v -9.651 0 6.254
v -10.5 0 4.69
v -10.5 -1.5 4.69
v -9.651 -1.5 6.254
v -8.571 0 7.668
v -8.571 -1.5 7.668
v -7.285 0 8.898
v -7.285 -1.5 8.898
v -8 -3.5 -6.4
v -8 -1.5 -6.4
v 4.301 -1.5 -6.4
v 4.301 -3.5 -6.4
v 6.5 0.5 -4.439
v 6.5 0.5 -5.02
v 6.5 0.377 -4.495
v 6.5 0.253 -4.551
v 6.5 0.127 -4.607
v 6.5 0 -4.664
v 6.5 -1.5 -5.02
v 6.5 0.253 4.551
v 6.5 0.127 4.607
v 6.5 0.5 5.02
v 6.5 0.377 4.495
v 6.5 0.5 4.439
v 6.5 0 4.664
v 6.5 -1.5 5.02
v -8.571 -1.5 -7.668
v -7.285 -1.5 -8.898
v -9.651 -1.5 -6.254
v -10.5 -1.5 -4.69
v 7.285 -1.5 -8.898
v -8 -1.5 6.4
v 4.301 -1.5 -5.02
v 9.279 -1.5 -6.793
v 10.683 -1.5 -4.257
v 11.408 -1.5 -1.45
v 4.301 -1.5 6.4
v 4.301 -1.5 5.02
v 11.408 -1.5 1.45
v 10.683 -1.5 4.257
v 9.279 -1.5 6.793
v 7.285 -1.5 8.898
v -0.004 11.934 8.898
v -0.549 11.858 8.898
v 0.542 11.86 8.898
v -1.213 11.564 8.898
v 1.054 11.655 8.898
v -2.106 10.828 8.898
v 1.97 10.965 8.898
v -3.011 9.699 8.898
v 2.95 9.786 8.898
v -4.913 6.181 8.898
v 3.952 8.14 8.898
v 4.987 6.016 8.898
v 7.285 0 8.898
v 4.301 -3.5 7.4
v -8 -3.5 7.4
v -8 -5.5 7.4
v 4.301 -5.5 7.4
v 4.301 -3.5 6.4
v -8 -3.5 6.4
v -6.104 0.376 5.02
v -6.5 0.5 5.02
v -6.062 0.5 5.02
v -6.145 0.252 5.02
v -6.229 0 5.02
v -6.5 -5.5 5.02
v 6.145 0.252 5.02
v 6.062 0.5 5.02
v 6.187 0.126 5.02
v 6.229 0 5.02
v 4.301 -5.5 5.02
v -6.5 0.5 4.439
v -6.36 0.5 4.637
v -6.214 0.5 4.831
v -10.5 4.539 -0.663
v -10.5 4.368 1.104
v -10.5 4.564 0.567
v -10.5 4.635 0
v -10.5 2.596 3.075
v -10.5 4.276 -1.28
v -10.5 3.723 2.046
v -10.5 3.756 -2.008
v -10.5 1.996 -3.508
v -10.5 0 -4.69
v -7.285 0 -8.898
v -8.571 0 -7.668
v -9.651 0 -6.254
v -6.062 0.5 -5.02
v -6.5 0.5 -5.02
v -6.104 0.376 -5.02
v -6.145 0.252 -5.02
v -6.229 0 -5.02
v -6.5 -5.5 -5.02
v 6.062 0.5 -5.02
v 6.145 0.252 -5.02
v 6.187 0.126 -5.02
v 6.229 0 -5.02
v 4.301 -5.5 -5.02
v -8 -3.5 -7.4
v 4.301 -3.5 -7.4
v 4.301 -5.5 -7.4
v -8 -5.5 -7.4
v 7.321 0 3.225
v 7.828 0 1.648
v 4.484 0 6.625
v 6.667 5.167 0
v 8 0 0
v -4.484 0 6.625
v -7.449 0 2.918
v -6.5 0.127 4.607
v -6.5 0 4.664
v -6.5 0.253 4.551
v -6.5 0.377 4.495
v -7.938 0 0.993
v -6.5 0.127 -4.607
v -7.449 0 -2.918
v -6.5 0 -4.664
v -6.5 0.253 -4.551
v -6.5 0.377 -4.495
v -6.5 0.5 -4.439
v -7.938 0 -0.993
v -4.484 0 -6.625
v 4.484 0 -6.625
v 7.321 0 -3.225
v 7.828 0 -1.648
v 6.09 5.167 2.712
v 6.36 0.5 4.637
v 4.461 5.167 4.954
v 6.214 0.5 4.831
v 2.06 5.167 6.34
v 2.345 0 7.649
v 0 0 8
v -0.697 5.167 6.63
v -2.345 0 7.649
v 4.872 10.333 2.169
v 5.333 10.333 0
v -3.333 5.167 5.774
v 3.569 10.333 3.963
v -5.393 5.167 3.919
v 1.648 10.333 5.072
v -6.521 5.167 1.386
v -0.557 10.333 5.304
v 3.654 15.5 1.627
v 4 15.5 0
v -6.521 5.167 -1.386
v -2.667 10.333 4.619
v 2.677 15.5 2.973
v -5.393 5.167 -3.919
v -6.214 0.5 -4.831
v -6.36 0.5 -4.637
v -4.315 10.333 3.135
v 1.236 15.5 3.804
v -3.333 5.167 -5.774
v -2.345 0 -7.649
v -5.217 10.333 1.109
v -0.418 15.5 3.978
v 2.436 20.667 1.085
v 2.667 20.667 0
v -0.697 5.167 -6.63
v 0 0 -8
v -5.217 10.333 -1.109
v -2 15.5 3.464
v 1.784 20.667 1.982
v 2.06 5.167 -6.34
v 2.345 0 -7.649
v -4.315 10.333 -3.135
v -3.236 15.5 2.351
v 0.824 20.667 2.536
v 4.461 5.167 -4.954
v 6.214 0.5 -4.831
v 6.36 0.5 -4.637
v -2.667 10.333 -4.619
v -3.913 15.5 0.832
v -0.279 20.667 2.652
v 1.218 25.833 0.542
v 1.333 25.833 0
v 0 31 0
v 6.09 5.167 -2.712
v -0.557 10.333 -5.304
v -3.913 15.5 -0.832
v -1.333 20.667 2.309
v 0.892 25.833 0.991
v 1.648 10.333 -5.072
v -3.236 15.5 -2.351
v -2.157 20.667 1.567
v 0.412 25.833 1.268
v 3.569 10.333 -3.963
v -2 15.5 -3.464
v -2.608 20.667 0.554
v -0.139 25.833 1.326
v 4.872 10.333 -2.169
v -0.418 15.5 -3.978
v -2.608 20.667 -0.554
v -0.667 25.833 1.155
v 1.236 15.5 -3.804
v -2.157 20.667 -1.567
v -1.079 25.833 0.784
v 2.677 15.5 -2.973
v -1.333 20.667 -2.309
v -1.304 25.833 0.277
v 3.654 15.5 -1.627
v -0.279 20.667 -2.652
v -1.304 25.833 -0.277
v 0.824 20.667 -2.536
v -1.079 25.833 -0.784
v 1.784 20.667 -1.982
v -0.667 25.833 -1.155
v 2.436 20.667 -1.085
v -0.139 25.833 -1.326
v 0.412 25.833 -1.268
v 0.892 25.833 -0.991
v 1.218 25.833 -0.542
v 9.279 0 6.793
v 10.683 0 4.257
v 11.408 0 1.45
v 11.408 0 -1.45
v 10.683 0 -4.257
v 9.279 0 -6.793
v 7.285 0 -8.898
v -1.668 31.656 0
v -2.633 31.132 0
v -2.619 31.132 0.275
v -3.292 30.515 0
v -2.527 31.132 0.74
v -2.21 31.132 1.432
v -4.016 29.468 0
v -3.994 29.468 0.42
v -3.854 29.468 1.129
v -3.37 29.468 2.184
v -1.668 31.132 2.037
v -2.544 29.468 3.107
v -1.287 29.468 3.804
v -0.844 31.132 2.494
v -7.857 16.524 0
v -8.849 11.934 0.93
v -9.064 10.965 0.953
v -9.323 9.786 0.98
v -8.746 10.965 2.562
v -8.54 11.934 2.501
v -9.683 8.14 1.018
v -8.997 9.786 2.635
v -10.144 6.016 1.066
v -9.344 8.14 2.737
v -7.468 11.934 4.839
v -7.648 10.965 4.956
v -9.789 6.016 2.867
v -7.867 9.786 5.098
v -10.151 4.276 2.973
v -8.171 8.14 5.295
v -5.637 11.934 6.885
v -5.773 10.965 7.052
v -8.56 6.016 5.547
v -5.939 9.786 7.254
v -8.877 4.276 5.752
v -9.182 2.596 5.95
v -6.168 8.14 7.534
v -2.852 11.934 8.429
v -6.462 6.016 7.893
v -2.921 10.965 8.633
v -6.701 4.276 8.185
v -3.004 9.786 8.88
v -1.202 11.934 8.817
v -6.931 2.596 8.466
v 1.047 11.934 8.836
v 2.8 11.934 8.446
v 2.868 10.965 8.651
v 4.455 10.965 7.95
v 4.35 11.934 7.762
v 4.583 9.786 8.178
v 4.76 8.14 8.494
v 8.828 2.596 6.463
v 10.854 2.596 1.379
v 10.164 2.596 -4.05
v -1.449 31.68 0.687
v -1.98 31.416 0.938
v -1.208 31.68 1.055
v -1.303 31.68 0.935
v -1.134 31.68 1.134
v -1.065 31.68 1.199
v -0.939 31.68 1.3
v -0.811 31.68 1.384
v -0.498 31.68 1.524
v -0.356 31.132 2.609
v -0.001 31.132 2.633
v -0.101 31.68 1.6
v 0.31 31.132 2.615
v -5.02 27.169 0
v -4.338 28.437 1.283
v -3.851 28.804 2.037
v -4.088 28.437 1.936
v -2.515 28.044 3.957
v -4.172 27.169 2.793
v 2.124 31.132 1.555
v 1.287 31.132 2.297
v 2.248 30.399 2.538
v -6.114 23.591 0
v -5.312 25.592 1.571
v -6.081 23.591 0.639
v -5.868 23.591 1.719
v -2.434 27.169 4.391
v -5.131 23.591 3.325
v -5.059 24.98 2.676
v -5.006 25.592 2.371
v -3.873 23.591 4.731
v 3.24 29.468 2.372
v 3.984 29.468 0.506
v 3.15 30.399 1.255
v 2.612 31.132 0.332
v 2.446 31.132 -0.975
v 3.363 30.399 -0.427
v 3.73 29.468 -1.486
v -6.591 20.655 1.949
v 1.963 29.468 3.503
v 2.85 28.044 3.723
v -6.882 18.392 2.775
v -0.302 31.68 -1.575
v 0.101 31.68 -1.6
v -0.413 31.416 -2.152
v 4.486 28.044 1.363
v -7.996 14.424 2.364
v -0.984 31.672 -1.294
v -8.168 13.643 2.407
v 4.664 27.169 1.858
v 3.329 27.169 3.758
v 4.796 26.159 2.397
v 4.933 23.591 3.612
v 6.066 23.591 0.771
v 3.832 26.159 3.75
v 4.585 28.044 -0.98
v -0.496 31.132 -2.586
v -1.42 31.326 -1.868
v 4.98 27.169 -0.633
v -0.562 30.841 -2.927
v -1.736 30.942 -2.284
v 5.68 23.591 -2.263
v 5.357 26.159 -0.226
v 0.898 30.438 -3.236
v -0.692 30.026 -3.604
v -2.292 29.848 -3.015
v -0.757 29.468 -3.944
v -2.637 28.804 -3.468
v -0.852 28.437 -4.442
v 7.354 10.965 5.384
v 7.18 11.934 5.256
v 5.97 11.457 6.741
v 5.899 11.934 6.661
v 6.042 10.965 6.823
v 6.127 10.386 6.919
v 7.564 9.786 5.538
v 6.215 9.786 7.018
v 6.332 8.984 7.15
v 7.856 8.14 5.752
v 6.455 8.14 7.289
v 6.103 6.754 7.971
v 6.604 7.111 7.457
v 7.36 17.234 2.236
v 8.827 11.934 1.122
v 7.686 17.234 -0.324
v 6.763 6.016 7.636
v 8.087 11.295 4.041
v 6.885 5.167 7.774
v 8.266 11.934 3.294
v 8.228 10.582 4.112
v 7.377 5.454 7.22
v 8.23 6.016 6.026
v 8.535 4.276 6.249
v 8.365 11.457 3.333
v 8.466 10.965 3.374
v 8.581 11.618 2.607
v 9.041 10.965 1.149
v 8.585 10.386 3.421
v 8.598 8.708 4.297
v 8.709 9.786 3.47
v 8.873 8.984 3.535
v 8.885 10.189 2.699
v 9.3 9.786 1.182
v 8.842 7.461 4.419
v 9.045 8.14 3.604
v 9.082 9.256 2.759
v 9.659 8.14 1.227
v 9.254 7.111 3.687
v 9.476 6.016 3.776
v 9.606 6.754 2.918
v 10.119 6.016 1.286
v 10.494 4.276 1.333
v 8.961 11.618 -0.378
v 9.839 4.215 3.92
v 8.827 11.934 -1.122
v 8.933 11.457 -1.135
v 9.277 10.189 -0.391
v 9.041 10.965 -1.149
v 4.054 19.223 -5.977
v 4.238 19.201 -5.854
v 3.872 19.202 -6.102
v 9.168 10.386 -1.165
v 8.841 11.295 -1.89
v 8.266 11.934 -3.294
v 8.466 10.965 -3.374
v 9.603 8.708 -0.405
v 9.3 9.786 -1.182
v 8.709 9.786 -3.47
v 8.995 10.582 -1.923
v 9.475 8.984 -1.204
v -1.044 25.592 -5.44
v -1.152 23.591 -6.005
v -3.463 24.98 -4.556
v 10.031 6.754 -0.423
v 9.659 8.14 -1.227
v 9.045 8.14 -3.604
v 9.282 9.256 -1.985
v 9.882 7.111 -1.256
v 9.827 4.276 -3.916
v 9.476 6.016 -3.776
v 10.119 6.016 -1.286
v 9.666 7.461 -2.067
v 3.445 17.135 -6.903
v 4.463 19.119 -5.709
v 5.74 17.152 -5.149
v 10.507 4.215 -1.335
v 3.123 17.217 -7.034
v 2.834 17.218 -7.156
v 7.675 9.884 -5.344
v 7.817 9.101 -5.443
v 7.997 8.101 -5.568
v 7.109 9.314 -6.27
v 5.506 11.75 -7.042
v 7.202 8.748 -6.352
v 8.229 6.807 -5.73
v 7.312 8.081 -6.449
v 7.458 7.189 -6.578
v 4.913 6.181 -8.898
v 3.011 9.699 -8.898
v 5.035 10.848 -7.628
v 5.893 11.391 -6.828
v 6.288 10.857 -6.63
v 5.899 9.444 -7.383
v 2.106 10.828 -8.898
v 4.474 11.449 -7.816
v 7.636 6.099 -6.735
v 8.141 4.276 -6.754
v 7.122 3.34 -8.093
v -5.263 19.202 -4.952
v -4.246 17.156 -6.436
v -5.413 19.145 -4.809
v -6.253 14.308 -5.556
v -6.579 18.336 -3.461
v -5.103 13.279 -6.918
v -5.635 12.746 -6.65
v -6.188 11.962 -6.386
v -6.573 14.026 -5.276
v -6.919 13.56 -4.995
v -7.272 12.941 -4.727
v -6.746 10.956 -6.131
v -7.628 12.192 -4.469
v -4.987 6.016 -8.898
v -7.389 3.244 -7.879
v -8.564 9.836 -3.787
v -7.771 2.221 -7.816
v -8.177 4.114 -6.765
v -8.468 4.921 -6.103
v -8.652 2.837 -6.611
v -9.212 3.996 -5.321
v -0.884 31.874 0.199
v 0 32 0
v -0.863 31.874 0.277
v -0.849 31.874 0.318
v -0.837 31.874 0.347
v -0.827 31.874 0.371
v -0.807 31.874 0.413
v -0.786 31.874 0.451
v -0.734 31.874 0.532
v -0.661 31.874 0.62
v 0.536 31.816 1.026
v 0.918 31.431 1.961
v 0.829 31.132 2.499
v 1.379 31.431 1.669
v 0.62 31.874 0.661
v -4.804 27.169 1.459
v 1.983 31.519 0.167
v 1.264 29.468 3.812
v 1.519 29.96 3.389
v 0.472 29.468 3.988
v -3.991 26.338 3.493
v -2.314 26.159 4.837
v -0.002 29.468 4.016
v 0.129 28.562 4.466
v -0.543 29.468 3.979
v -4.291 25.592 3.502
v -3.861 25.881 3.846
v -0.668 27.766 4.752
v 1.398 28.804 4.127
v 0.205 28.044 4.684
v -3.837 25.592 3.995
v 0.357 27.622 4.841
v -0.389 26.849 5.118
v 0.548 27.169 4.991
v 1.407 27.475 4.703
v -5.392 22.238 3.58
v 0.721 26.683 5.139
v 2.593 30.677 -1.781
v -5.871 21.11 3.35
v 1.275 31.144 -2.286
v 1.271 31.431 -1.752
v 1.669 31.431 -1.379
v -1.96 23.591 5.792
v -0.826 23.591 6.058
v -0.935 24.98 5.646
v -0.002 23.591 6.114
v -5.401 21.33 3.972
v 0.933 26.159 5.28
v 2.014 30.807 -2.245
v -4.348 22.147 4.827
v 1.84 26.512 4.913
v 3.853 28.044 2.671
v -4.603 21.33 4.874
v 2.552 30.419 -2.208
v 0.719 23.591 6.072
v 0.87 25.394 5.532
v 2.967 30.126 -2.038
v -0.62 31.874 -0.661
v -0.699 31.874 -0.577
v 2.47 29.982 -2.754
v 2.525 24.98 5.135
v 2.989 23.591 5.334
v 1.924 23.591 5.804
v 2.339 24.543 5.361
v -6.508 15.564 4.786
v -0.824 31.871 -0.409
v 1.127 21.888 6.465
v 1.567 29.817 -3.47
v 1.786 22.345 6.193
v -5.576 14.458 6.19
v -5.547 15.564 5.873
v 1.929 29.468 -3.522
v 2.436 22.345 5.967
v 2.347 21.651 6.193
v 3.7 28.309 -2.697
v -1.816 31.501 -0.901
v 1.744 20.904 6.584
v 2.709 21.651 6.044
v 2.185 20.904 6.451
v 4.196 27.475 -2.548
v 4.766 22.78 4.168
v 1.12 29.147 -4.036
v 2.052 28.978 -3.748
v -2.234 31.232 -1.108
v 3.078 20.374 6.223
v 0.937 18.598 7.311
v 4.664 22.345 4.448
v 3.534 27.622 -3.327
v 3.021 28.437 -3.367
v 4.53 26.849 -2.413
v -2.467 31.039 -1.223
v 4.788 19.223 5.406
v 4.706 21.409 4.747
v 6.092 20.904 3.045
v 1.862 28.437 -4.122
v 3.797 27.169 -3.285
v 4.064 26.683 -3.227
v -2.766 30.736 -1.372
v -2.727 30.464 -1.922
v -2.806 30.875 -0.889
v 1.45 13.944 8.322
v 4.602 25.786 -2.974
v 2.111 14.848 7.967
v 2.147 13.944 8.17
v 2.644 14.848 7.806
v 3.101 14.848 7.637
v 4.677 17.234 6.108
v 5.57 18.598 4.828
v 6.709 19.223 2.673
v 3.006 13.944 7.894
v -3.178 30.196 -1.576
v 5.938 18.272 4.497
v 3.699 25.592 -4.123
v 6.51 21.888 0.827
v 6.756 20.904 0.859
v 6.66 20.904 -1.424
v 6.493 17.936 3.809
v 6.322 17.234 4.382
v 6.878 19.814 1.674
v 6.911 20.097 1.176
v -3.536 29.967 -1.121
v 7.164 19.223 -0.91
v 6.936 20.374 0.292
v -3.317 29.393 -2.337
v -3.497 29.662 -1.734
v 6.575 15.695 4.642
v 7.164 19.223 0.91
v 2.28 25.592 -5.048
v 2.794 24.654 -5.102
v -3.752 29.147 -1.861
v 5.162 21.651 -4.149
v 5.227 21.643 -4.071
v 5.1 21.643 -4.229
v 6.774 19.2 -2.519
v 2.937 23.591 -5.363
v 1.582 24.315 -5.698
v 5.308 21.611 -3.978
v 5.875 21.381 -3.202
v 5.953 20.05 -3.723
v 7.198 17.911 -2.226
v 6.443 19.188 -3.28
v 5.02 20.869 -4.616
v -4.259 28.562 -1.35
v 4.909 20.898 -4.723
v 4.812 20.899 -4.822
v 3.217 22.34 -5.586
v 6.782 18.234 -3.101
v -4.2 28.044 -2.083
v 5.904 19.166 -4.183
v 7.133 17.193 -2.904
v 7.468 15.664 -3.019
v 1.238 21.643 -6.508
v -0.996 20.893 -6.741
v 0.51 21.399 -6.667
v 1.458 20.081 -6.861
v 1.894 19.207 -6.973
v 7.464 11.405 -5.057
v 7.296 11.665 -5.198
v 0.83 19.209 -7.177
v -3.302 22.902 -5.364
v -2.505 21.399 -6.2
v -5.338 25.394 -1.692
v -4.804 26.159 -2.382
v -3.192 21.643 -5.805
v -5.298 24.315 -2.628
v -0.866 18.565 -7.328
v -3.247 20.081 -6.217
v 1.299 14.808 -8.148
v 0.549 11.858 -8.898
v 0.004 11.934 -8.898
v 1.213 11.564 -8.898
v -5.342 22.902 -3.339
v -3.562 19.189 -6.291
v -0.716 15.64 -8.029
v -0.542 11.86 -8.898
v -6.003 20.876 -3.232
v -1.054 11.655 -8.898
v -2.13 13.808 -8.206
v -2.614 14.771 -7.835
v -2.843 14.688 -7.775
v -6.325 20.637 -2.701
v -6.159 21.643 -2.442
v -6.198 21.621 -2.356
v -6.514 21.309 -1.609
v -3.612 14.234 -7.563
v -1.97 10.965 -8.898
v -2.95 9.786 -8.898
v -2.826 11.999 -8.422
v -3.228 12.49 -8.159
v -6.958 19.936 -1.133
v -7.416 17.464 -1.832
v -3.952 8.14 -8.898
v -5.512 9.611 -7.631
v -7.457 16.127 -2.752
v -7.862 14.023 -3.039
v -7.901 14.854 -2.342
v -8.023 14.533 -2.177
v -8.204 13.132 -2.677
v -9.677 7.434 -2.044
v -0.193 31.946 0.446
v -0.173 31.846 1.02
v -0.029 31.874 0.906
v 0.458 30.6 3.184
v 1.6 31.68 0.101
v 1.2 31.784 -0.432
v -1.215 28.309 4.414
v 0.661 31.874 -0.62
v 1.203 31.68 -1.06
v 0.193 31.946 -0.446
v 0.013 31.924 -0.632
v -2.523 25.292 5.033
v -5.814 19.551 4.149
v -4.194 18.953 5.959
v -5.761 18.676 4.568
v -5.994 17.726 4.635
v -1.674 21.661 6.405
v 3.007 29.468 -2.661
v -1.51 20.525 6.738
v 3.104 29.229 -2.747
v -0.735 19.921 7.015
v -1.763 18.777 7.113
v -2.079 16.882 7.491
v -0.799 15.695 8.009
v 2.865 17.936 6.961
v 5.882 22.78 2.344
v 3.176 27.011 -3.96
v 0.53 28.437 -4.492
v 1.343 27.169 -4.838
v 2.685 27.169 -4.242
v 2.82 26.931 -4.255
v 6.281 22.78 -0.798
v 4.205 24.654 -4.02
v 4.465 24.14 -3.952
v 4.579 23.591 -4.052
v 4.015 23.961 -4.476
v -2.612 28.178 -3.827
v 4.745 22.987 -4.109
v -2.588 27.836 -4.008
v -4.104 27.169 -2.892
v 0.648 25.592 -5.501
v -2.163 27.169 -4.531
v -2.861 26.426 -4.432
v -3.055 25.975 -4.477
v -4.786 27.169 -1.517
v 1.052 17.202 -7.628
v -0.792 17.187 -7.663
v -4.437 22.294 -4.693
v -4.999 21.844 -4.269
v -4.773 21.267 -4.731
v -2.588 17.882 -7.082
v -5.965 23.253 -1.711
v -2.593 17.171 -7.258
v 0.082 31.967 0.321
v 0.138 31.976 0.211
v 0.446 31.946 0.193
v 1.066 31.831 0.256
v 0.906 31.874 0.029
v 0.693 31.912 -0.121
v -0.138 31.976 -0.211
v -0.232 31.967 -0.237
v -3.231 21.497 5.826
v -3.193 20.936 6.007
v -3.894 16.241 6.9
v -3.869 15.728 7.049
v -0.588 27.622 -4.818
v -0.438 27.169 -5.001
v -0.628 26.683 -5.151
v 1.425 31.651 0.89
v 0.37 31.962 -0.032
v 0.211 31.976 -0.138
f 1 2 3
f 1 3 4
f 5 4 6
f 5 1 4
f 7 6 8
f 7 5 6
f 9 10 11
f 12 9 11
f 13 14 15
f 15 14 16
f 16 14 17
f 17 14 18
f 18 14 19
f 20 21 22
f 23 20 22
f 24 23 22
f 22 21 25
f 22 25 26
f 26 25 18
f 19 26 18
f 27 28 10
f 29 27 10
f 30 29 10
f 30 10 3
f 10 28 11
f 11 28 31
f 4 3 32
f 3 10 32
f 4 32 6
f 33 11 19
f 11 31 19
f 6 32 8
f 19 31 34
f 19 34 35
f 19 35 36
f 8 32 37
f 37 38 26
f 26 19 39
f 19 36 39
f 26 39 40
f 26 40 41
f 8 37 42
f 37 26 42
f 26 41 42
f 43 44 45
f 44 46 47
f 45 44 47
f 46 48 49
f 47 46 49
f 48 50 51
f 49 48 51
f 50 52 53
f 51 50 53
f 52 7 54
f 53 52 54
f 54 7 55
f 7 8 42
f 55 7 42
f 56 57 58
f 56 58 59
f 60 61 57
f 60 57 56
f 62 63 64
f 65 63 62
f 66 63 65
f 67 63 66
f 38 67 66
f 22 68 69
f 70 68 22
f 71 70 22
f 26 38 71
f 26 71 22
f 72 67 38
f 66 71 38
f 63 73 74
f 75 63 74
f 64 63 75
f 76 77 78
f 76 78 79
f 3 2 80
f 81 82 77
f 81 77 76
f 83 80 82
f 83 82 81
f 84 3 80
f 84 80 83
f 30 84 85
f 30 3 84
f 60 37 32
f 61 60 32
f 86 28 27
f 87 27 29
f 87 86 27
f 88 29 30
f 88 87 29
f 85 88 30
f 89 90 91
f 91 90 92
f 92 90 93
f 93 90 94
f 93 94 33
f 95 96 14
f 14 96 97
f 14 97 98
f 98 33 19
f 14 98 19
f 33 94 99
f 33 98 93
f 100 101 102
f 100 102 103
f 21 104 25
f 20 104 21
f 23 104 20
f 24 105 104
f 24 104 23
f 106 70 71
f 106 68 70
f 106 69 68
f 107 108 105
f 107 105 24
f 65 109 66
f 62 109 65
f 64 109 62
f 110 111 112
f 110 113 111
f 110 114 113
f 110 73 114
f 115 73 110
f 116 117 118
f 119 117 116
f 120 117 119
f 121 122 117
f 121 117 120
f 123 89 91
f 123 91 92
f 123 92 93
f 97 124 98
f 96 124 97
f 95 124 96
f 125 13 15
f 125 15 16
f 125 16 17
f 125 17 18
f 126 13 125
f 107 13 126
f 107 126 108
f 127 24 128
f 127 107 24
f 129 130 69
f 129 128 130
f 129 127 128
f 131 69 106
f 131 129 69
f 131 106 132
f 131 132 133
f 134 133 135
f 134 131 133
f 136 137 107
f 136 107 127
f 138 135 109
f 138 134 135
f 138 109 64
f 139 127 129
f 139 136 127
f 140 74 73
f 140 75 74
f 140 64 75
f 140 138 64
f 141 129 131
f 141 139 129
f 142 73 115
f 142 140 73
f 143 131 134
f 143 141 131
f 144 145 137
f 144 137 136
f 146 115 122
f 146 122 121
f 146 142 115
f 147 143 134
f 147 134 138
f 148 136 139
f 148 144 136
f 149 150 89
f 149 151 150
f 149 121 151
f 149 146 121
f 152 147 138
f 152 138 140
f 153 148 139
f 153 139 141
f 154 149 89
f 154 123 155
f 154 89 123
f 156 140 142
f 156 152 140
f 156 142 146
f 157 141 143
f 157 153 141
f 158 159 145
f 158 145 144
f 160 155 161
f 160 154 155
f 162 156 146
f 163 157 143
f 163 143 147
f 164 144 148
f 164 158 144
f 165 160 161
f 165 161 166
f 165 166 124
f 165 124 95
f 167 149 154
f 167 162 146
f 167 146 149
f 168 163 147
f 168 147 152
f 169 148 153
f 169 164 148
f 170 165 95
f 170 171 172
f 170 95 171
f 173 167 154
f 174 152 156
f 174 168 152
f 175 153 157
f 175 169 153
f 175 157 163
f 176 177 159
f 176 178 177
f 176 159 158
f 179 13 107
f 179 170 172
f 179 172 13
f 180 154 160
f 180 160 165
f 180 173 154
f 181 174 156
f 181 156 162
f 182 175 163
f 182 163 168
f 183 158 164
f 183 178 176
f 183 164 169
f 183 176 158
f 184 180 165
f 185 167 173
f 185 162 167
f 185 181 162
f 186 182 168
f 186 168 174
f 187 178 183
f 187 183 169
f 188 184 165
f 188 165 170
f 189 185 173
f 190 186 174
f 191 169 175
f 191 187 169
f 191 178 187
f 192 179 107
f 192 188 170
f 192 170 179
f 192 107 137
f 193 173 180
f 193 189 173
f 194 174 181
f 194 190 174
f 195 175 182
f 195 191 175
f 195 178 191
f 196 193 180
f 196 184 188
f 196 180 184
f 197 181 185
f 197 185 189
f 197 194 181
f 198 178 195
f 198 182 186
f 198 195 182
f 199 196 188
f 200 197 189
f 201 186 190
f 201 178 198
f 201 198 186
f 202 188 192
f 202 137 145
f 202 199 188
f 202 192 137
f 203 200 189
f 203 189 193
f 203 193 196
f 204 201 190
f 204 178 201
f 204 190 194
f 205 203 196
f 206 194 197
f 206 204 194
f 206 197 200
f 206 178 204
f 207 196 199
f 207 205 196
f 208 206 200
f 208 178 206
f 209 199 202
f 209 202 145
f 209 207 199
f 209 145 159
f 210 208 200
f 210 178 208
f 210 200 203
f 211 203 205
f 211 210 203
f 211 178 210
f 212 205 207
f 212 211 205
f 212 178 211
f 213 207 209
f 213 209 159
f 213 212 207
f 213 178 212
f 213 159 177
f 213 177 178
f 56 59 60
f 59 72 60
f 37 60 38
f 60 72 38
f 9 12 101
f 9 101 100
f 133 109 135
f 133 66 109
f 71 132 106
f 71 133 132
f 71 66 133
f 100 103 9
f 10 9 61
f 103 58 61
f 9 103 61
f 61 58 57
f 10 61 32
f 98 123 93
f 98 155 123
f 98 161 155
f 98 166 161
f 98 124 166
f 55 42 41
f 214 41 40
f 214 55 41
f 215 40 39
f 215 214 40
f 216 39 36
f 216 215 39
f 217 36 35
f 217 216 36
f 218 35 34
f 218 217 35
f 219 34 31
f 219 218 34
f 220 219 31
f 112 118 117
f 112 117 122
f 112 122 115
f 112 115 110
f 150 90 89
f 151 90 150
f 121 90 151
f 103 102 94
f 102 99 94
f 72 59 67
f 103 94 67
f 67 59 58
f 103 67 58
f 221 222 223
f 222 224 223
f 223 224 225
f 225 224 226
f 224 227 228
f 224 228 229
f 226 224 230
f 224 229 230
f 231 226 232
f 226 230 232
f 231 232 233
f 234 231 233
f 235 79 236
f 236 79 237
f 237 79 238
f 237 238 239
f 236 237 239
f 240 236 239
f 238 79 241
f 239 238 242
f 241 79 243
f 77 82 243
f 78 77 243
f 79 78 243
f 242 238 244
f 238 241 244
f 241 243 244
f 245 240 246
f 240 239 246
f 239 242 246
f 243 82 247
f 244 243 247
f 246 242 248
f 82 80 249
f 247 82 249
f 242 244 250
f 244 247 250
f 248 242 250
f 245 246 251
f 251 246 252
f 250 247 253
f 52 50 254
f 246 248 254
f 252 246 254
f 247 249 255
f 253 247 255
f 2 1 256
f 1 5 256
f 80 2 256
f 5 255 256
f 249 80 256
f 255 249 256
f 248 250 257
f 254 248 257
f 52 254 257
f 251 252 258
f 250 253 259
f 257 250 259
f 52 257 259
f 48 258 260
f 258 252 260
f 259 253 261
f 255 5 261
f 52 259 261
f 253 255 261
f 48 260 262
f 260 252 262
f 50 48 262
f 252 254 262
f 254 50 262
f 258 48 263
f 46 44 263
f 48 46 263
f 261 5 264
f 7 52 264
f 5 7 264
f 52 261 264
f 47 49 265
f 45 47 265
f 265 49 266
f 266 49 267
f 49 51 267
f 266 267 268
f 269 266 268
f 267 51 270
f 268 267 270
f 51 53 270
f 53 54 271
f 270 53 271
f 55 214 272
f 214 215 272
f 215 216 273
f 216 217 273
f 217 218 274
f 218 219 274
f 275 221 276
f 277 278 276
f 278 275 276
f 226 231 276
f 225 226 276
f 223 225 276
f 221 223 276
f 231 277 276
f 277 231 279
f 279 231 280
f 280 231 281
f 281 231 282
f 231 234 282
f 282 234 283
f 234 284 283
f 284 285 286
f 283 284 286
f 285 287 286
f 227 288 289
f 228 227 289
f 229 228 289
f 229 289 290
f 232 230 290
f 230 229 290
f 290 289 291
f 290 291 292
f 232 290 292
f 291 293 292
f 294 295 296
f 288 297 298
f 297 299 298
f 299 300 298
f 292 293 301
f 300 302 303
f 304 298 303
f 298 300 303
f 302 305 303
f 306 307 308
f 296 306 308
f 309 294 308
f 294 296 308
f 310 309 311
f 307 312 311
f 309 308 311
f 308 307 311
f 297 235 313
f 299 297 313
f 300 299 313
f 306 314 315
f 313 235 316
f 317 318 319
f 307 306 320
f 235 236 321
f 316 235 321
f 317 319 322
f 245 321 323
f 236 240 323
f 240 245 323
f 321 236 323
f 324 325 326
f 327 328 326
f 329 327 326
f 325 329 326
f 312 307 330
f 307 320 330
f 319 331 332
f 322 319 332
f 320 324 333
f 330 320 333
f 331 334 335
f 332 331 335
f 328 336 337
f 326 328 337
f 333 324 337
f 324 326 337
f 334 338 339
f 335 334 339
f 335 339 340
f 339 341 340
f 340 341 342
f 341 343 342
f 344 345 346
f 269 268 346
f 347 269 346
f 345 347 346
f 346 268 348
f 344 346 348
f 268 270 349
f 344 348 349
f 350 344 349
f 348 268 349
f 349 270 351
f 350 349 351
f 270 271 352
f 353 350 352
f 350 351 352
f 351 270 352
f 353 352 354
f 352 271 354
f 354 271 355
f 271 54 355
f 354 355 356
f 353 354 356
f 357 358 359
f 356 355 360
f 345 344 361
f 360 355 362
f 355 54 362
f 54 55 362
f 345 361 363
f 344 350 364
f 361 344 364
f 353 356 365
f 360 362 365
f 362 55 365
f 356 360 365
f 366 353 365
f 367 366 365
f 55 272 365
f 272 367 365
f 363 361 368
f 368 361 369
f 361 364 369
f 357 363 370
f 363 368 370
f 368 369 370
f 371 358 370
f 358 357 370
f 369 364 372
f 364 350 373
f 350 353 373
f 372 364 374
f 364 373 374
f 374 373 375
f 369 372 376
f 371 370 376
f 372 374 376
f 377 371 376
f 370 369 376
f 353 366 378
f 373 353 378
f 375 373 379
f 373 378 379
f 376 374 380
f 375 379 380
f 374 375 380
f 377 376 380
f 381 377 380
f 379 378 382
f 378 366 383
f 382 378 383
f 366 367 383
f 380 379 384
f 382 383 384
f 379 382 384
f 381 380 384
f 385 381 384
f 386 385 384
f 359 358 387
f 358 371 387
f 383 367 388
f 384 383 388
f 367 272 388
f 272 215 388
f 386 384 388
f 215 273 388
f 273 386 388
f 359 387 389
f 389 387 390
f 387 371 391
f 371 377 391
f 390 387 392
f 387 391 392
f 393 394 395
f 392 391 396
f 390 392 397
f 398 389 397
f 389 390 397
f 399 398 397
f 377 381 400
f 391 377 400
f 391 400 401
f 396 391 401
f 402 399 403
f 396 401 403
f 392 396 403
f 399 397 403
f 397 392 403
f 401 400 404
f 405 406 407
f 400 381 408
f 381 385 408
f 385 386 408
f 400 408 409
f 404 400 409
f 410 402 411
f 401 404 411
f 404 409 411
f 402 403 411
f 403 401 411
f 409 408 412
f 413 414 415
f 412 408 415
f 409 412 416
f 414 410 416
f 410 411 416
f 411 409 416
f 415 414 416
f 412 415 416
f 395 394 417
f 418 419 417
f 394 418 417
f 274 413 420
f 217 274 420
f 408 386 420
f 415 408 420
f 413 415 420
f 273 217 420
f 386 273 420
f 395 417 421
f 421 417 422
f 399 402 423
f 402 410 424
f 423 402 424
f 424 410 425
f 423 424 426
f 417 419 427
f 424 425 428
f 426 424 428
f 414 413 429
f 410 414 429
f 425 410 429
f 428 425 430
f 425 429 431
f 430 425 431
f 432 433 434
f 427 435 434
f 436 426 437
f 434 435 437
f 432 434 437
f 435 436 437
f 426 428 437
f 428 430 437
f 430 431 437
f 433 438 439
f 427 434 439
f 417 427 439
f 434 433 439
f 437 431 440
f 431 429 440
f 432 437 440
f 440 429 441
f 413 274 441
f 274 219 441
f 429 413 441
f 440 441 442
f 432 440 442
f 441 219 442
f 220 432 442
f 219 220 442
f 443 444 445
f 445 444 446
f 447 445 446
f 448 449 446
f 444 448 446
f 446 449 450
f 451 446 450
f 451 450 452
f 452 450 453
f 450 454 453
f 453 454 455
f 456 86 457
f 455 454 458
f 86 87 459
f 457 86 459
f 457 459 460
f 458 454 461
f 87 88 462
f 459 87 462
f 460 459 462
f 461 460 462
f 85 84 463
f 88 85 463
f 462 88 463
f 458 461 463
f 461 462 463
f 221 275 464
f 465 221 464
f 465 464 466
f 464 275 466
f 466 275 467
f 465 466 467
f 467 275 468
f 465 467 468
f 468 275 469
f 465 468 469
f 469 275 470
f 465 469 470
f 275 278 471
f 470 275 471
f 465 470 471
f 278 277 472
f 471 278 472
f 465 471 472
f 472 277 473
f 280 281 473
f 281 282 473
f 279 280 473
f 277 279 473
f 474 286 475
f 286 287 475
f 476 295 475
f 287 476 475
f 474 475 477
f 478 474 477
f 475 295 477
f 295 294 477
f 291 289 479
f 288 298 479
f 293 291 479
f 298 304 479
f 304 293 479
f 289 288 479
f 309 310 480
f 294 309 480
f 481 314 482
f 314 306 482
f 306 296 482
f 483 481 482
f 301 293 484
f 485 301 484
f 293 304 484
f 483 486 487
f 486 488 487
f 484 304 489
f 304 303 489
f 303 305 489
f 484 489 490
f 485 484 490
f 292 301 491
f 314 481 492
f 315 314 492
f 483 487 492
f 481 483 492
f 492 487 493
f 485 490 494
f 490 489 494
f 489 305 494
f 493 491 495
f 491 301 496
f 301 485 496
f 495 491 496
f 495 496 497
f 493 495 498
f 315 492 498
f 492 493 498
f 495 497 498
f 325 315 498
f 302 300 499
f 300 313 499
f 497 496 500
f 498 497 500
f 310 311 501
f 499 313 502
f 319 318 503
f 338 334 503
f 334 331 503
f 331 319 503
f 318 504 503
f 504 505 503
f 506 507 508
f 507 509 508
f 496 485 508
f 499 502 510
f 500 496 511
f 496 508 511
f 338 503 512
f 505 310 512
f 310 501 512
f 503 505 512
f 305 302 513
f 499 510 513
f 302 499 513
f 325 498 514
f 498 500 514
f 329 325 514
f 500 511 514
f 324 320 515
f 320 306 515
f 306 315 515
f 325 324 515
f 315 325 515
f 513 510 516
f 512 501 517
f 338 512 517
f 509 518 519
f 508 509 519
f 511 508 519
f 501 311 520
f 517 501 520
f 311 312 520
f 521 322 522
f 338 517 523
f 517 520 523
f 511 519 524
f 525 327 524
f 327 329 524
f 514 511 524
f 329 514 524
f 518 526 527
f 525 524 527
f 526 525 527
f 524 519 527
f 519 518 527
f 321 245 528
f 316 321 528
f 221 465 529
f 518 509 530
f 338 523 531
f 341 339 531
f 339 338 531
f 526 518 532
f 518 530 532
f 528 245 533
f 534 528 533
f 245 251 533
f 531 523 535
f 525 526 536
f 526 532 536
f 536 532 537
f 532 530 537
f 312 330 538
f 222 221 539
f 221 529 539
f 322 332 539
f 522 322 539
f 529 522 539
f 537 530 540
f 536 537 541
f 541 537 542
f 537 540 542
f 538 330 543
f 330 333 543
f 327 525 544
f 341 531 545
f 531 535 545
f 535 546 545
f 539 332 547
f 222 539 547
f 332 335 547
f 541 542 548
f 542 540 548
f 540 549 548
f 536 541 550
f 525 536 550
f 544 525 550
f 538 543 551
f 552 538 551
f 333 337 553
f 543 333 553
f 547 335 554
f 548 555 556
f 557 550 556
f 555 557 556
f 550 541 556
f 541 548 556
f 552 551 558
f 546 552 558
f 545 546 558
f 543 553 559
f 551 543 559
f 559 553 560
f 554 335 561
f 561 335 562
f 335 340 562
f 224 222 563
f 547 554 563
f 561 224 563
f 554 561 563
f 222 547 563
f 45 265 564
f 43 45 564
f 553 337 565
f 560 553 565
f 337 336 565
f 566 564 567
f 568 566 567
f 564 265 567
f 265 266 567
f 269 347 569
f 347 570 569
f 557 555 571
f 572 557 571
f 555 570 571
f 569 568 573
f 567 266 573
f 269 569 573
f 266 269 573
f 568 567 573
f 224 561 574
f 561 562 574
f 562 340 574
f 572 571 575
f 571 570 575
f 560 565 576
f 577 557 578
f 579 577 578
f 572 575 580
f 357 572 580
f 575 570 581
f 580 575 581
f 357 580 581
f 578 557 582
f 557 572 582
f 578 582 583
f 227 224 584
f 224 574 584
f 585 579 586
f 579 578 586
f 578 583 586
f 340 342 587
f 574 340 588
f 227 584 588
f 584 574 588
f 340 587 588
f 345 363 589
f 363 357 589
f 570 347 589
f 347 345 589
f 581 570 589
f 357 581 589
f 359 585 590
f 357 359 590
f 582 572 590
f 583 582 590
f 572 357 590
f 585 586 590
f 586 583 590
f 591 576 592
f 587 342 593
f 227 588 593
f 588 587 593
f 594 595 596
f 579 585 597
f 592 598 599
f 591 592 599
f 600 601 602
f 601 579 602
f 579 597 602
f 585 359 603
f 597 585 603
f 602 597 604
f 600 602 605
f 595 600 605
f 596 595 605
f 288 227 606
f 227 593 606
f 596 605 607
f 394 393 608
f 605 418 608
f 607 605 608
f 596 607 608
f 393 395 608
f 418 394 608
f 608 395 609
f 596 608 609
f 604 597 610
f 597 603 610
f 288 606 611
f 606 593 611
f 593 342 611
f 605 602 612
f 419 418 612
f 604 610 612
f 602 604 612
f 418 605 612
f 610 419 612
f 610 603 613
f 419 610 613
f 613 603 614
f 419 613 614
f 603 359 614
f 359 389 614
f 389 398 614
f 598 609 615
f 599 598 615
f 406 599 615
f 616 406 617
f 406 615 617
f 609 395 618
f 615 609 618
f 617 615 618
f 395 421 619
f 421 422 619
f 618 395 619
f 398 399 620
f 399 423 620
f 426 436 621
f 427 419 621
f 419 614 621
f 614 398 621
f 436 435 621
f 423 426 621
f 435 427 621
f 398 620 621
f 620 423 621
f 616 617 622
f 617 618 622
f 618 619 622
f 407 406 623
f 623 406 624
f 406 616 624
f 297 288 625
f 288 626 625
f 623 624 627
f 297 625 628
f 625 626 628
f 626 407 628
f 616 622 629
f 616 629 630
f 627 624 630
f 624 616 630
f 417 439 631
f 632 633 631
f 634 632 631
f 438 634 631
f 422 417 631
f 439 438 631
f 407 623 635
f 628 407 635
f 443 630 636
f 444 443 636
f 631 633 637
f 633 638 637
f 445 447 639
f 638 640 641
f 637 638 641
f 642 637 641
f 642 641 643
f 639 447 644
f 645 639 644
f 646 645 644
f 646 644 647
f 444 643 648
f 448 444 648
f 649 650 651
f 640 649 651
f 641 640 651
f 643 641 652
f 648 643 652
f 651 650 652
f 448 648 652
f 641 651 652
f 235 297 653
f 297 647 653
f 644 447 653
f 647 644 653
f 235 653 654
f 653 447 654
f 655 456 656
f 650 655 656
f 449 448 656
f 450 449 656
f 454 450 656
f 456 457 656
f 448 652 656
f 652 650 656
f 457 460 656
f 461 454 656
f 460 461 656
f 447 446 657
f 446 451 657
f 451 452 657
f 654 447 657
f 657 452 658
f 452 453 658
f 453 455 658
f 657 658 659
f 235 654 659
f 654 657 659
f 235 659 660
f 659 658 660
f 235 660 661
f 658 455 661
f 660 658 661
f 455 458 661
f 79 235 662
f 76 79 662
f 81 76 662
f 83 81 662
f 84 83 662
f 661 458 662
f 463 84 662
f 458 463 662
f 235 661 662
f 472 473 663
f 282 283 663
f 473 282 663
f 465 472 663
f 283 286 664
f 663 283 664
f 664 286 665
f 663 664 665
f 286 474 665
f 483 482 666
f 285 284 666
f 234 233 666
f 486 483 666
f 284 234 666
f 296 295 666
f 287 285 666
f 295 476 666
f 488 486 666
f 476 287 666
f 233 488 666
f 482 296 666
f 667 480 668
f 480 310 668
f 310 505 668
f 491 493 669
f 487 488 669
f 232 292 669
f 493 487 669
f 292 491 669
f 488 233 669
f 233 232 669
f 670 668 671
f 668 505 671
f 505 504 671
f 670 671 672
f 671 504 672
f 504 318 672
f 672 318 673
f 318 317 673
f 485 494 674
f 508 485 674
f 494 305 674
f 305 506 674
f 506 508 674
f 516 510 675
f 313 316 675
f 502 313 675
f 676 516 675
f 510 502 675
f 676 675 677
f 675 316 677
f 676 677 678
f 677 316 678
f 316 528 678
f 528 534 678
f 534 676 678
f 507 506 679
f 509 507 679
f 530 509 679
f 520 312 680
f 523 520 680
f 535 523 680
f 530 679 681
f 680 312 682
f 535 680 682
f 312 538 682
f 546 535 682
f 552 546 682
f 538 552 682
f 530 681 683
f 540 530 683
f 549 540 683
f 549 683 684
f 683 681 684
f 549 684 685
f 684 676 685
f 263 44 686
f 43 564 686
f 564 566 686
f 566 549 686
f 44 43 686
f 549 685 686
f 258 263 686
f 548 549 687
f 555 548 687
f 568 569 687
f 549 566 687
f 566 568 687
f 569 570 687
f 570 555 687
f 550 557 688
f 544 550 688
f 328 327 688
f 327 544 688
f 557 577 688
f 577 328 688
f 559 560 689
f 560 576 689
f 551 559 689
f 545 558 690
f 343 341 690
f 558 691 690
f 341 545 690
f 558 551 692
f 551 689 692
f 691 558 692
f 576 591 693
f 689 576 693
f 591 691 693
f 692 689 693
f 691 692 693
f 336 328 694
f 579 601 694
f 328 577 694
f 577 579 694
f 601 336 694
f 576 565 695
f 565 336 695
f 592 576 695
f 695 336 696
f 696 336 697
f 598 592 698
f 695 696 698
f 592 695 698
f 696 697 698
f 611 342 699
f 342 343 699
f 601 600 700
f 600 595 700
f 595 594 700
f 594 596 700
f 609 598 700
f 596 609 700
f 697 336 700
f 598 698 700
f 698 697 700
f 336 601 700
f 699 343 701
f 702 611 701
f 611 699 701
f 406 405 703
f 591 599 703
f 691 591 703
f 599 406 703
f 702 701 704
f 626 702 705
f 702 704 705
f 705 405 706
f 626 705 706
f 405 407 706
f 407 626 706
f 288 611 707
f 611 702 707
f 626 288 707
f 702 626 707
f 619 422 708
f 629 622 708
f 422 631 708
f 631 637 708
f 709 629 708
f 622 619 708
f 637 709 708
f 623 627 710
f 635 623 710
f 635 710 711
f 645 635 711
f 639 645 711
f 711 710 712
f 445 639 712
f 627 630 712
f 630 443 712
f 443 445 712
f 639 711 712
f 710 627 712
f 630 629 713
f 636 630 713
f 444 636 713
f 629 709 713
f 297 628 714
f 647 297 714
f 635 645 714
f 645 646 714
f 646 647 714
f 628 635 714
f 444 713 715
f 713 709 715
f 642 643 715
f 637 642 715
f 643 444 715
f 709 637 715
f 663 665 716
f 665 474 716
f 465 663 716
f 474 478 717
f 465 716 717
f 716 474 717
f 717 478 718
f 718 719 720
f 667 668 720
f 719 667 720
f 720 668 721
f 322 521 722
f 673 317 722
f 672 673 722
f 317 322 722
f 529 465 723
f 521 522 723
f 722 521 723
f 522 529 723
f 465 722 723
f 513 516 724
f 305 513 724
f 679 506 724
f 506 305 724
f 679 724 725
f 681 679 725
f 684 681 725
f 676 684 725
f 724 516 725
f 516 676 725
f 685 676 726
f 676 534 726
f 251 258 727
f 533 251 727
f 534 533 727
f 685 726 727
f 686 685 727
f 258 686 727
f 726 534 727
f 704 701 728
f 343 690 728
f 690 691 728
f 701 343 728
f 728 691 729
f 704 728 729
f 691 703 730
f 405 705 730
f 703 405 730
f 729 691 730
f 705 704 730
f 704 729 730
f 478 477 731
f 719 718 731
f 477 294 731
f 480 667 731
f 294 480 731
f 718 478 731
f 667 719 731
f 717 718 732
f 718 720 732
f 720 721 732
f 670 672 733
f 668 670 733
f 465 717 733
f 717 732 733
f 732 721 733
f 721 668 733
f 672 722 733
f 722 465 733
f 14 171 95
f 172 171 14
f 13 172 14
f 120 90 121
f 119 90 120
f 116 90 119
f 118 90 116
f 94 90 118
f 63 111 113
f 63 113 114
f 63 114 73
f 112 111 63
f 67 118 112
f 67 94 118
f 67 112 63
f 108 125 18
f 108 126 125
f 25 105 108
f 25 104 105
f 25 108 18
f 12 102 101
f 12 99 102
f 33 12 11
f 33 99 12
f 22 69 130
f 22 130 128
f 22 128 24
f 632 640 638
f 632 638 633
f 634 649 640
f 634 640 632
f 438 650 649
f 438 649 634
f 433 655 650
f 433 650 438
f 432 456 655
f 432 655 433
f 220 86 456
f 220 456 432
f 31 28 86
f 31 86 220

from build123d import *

# Parameters (mm, degrees)
SKETCH_4_R          = 11.5
EXTRUDE_1_DEPTH     = 1.5
EXTRUDE_2_DEPTH     = 4
SKETCH_7_W          = 13
SKETCH_7_H          = 10.04
CUT_EXTRUDE_3_DEPTH = 2
CUT_EXTRUDE_4_DEPTH = 38.239092514
SKETCH_9_W          = 12.301126192
SKETCH_9_H          = 2
EXTRUDE_3_DEPTH     = 1
SKETCH_10_W         = 12.301126192
SKETCH_10_H         = 2
EXTRUDE_4_DEPTH     = 1


with BuildPart() as part:
    # 草图2 → 旋转1 (revolve)
    with BuildSketch(Plane.XY):
        with BuildLine():
            Line((0, 0), (-11.5, 0))
            add(Edge.make_bspline(
                [(0, 32), (-4.710300768, 31.615095885), (-11.5, 0)],
                knots=[0, 0, 0, 1, 1, 1], degree=2, weights=[1, 2.551315819, 1]))
            Line((0, 32), (0, 0))
        make_face()
    revolve(axis=Axis((0, 0, 0), (0, 1, 0)))

    # 草图3 → 切除-旋转1 (revolve, cut)
    with BuildSketch(Plane.XY, mode=Mode.PRIVATE) as cut_revolve_1_sk:
        Polygon((0, 31), (0, 0), (-8, 0), align=None)
    revolve(cut_revolve_1_sk.sketch.rotate(Axis((0, 31, 0), (0, -1, 0)), 180), axis=Axis((0, 31, 0), (0, -1, 0)), mode=Mode.SUBTRACT)

    # 草图4 → 凸台-拉伸1 (add)
    with BuildSketch(Plane(origin=(0, 0, 0), x_dir=(1, 0, 0), z_dir=(0, 1, 0))):
        with Locations(Location((0, 0, 0), (0, 0, 270))):
            Circle(SKETCH_4_R)
    extrude(amount=-EXTRUDE_1_DEPTH)

    # 草图5 → 凸台-拉伸2 (add)
    with BuildSketch(Plane.XZ.offset(1.5)):
        Polygon((4.301126192, 6.4), (4.301126192, 5.02), (-6.5, 5.02), (-6.5, -5.02), (4.301126192, -5.02), (4.301126192, -6.4), (-6.618873808, -6.4), (-8, -6.4), (-8, 6.4), (-6.618873808, 6.4), align=None)
    extrude(amount=EXTRUDE_2_DEPTH)

    # 草图7 → 切除-拉伸3 (cut)
    with BuildSketch(Plane.XZ.offset(1.5)):
        Rectangle(SKETCH_7_W, SKETCH_7_H)
    extrude(amount=-CUT_EXTRUDE_3_DEPTH, mode=Mode.SUBTRACT)

    # 草图8 → 切除-拉伸4 (cut, through all)
    with BuildSketch(Plane(origin=(0, -1.5, 0), x_dir=(-1, 0, 0), z_dir=(0, -1, 0))):
        with BuildLine():
            Line((10.500185713, -4.69), (10.500185713, 4.69))
            ThreePointArc((10.500185713, 4.69), (11.5, 0), (10.500185713, -4.69))
        make_face()
        with BuildLine():
            Line((7.285, -8.898245614), (-7.285, -8.898245614))
            ThreePointArc((-7.285, -8.898245614), (0, -11.5), (7.285, -8.898245614))
        make_face()
        with BuildLine():
            Line((7.285, 8.898245614), (-7.285, 8.898245614))
            ThreePointArc((-7.285, 8.898245614), (0, 11.5), (7.285, 8.898245614))
        make_face()
    extrude(amount=-CUT_EXTRUDE_4_DEPTH, mode=Mode.SUBTRACT)

    # 草图9 → 凸台-拉伸3 (add)
    with BuildSketch(Plane.XY.offset(6.4)):
        with Locations((-1.849436904, -4.5)):
            Rectangle(SKETCH_9_W, SKETCH_9_H)
    extrude(amount=EXTRUDE_3_DEPTH)

    # 草图10 → 凸台-拉伸4 (add)
    with BuildSketch(Plane(origin=(0, 0, -6.4), x_dir=(-1, 0, 0), z_dir=(0, 0, -1))):
        with Locations((1.849436904, -4.5)):
            Rectangle(SKETCH_10_W, SKETCH_10_H)
    extrude(amount=EXTRUDE_4_DEPTH)


solid = part.part
